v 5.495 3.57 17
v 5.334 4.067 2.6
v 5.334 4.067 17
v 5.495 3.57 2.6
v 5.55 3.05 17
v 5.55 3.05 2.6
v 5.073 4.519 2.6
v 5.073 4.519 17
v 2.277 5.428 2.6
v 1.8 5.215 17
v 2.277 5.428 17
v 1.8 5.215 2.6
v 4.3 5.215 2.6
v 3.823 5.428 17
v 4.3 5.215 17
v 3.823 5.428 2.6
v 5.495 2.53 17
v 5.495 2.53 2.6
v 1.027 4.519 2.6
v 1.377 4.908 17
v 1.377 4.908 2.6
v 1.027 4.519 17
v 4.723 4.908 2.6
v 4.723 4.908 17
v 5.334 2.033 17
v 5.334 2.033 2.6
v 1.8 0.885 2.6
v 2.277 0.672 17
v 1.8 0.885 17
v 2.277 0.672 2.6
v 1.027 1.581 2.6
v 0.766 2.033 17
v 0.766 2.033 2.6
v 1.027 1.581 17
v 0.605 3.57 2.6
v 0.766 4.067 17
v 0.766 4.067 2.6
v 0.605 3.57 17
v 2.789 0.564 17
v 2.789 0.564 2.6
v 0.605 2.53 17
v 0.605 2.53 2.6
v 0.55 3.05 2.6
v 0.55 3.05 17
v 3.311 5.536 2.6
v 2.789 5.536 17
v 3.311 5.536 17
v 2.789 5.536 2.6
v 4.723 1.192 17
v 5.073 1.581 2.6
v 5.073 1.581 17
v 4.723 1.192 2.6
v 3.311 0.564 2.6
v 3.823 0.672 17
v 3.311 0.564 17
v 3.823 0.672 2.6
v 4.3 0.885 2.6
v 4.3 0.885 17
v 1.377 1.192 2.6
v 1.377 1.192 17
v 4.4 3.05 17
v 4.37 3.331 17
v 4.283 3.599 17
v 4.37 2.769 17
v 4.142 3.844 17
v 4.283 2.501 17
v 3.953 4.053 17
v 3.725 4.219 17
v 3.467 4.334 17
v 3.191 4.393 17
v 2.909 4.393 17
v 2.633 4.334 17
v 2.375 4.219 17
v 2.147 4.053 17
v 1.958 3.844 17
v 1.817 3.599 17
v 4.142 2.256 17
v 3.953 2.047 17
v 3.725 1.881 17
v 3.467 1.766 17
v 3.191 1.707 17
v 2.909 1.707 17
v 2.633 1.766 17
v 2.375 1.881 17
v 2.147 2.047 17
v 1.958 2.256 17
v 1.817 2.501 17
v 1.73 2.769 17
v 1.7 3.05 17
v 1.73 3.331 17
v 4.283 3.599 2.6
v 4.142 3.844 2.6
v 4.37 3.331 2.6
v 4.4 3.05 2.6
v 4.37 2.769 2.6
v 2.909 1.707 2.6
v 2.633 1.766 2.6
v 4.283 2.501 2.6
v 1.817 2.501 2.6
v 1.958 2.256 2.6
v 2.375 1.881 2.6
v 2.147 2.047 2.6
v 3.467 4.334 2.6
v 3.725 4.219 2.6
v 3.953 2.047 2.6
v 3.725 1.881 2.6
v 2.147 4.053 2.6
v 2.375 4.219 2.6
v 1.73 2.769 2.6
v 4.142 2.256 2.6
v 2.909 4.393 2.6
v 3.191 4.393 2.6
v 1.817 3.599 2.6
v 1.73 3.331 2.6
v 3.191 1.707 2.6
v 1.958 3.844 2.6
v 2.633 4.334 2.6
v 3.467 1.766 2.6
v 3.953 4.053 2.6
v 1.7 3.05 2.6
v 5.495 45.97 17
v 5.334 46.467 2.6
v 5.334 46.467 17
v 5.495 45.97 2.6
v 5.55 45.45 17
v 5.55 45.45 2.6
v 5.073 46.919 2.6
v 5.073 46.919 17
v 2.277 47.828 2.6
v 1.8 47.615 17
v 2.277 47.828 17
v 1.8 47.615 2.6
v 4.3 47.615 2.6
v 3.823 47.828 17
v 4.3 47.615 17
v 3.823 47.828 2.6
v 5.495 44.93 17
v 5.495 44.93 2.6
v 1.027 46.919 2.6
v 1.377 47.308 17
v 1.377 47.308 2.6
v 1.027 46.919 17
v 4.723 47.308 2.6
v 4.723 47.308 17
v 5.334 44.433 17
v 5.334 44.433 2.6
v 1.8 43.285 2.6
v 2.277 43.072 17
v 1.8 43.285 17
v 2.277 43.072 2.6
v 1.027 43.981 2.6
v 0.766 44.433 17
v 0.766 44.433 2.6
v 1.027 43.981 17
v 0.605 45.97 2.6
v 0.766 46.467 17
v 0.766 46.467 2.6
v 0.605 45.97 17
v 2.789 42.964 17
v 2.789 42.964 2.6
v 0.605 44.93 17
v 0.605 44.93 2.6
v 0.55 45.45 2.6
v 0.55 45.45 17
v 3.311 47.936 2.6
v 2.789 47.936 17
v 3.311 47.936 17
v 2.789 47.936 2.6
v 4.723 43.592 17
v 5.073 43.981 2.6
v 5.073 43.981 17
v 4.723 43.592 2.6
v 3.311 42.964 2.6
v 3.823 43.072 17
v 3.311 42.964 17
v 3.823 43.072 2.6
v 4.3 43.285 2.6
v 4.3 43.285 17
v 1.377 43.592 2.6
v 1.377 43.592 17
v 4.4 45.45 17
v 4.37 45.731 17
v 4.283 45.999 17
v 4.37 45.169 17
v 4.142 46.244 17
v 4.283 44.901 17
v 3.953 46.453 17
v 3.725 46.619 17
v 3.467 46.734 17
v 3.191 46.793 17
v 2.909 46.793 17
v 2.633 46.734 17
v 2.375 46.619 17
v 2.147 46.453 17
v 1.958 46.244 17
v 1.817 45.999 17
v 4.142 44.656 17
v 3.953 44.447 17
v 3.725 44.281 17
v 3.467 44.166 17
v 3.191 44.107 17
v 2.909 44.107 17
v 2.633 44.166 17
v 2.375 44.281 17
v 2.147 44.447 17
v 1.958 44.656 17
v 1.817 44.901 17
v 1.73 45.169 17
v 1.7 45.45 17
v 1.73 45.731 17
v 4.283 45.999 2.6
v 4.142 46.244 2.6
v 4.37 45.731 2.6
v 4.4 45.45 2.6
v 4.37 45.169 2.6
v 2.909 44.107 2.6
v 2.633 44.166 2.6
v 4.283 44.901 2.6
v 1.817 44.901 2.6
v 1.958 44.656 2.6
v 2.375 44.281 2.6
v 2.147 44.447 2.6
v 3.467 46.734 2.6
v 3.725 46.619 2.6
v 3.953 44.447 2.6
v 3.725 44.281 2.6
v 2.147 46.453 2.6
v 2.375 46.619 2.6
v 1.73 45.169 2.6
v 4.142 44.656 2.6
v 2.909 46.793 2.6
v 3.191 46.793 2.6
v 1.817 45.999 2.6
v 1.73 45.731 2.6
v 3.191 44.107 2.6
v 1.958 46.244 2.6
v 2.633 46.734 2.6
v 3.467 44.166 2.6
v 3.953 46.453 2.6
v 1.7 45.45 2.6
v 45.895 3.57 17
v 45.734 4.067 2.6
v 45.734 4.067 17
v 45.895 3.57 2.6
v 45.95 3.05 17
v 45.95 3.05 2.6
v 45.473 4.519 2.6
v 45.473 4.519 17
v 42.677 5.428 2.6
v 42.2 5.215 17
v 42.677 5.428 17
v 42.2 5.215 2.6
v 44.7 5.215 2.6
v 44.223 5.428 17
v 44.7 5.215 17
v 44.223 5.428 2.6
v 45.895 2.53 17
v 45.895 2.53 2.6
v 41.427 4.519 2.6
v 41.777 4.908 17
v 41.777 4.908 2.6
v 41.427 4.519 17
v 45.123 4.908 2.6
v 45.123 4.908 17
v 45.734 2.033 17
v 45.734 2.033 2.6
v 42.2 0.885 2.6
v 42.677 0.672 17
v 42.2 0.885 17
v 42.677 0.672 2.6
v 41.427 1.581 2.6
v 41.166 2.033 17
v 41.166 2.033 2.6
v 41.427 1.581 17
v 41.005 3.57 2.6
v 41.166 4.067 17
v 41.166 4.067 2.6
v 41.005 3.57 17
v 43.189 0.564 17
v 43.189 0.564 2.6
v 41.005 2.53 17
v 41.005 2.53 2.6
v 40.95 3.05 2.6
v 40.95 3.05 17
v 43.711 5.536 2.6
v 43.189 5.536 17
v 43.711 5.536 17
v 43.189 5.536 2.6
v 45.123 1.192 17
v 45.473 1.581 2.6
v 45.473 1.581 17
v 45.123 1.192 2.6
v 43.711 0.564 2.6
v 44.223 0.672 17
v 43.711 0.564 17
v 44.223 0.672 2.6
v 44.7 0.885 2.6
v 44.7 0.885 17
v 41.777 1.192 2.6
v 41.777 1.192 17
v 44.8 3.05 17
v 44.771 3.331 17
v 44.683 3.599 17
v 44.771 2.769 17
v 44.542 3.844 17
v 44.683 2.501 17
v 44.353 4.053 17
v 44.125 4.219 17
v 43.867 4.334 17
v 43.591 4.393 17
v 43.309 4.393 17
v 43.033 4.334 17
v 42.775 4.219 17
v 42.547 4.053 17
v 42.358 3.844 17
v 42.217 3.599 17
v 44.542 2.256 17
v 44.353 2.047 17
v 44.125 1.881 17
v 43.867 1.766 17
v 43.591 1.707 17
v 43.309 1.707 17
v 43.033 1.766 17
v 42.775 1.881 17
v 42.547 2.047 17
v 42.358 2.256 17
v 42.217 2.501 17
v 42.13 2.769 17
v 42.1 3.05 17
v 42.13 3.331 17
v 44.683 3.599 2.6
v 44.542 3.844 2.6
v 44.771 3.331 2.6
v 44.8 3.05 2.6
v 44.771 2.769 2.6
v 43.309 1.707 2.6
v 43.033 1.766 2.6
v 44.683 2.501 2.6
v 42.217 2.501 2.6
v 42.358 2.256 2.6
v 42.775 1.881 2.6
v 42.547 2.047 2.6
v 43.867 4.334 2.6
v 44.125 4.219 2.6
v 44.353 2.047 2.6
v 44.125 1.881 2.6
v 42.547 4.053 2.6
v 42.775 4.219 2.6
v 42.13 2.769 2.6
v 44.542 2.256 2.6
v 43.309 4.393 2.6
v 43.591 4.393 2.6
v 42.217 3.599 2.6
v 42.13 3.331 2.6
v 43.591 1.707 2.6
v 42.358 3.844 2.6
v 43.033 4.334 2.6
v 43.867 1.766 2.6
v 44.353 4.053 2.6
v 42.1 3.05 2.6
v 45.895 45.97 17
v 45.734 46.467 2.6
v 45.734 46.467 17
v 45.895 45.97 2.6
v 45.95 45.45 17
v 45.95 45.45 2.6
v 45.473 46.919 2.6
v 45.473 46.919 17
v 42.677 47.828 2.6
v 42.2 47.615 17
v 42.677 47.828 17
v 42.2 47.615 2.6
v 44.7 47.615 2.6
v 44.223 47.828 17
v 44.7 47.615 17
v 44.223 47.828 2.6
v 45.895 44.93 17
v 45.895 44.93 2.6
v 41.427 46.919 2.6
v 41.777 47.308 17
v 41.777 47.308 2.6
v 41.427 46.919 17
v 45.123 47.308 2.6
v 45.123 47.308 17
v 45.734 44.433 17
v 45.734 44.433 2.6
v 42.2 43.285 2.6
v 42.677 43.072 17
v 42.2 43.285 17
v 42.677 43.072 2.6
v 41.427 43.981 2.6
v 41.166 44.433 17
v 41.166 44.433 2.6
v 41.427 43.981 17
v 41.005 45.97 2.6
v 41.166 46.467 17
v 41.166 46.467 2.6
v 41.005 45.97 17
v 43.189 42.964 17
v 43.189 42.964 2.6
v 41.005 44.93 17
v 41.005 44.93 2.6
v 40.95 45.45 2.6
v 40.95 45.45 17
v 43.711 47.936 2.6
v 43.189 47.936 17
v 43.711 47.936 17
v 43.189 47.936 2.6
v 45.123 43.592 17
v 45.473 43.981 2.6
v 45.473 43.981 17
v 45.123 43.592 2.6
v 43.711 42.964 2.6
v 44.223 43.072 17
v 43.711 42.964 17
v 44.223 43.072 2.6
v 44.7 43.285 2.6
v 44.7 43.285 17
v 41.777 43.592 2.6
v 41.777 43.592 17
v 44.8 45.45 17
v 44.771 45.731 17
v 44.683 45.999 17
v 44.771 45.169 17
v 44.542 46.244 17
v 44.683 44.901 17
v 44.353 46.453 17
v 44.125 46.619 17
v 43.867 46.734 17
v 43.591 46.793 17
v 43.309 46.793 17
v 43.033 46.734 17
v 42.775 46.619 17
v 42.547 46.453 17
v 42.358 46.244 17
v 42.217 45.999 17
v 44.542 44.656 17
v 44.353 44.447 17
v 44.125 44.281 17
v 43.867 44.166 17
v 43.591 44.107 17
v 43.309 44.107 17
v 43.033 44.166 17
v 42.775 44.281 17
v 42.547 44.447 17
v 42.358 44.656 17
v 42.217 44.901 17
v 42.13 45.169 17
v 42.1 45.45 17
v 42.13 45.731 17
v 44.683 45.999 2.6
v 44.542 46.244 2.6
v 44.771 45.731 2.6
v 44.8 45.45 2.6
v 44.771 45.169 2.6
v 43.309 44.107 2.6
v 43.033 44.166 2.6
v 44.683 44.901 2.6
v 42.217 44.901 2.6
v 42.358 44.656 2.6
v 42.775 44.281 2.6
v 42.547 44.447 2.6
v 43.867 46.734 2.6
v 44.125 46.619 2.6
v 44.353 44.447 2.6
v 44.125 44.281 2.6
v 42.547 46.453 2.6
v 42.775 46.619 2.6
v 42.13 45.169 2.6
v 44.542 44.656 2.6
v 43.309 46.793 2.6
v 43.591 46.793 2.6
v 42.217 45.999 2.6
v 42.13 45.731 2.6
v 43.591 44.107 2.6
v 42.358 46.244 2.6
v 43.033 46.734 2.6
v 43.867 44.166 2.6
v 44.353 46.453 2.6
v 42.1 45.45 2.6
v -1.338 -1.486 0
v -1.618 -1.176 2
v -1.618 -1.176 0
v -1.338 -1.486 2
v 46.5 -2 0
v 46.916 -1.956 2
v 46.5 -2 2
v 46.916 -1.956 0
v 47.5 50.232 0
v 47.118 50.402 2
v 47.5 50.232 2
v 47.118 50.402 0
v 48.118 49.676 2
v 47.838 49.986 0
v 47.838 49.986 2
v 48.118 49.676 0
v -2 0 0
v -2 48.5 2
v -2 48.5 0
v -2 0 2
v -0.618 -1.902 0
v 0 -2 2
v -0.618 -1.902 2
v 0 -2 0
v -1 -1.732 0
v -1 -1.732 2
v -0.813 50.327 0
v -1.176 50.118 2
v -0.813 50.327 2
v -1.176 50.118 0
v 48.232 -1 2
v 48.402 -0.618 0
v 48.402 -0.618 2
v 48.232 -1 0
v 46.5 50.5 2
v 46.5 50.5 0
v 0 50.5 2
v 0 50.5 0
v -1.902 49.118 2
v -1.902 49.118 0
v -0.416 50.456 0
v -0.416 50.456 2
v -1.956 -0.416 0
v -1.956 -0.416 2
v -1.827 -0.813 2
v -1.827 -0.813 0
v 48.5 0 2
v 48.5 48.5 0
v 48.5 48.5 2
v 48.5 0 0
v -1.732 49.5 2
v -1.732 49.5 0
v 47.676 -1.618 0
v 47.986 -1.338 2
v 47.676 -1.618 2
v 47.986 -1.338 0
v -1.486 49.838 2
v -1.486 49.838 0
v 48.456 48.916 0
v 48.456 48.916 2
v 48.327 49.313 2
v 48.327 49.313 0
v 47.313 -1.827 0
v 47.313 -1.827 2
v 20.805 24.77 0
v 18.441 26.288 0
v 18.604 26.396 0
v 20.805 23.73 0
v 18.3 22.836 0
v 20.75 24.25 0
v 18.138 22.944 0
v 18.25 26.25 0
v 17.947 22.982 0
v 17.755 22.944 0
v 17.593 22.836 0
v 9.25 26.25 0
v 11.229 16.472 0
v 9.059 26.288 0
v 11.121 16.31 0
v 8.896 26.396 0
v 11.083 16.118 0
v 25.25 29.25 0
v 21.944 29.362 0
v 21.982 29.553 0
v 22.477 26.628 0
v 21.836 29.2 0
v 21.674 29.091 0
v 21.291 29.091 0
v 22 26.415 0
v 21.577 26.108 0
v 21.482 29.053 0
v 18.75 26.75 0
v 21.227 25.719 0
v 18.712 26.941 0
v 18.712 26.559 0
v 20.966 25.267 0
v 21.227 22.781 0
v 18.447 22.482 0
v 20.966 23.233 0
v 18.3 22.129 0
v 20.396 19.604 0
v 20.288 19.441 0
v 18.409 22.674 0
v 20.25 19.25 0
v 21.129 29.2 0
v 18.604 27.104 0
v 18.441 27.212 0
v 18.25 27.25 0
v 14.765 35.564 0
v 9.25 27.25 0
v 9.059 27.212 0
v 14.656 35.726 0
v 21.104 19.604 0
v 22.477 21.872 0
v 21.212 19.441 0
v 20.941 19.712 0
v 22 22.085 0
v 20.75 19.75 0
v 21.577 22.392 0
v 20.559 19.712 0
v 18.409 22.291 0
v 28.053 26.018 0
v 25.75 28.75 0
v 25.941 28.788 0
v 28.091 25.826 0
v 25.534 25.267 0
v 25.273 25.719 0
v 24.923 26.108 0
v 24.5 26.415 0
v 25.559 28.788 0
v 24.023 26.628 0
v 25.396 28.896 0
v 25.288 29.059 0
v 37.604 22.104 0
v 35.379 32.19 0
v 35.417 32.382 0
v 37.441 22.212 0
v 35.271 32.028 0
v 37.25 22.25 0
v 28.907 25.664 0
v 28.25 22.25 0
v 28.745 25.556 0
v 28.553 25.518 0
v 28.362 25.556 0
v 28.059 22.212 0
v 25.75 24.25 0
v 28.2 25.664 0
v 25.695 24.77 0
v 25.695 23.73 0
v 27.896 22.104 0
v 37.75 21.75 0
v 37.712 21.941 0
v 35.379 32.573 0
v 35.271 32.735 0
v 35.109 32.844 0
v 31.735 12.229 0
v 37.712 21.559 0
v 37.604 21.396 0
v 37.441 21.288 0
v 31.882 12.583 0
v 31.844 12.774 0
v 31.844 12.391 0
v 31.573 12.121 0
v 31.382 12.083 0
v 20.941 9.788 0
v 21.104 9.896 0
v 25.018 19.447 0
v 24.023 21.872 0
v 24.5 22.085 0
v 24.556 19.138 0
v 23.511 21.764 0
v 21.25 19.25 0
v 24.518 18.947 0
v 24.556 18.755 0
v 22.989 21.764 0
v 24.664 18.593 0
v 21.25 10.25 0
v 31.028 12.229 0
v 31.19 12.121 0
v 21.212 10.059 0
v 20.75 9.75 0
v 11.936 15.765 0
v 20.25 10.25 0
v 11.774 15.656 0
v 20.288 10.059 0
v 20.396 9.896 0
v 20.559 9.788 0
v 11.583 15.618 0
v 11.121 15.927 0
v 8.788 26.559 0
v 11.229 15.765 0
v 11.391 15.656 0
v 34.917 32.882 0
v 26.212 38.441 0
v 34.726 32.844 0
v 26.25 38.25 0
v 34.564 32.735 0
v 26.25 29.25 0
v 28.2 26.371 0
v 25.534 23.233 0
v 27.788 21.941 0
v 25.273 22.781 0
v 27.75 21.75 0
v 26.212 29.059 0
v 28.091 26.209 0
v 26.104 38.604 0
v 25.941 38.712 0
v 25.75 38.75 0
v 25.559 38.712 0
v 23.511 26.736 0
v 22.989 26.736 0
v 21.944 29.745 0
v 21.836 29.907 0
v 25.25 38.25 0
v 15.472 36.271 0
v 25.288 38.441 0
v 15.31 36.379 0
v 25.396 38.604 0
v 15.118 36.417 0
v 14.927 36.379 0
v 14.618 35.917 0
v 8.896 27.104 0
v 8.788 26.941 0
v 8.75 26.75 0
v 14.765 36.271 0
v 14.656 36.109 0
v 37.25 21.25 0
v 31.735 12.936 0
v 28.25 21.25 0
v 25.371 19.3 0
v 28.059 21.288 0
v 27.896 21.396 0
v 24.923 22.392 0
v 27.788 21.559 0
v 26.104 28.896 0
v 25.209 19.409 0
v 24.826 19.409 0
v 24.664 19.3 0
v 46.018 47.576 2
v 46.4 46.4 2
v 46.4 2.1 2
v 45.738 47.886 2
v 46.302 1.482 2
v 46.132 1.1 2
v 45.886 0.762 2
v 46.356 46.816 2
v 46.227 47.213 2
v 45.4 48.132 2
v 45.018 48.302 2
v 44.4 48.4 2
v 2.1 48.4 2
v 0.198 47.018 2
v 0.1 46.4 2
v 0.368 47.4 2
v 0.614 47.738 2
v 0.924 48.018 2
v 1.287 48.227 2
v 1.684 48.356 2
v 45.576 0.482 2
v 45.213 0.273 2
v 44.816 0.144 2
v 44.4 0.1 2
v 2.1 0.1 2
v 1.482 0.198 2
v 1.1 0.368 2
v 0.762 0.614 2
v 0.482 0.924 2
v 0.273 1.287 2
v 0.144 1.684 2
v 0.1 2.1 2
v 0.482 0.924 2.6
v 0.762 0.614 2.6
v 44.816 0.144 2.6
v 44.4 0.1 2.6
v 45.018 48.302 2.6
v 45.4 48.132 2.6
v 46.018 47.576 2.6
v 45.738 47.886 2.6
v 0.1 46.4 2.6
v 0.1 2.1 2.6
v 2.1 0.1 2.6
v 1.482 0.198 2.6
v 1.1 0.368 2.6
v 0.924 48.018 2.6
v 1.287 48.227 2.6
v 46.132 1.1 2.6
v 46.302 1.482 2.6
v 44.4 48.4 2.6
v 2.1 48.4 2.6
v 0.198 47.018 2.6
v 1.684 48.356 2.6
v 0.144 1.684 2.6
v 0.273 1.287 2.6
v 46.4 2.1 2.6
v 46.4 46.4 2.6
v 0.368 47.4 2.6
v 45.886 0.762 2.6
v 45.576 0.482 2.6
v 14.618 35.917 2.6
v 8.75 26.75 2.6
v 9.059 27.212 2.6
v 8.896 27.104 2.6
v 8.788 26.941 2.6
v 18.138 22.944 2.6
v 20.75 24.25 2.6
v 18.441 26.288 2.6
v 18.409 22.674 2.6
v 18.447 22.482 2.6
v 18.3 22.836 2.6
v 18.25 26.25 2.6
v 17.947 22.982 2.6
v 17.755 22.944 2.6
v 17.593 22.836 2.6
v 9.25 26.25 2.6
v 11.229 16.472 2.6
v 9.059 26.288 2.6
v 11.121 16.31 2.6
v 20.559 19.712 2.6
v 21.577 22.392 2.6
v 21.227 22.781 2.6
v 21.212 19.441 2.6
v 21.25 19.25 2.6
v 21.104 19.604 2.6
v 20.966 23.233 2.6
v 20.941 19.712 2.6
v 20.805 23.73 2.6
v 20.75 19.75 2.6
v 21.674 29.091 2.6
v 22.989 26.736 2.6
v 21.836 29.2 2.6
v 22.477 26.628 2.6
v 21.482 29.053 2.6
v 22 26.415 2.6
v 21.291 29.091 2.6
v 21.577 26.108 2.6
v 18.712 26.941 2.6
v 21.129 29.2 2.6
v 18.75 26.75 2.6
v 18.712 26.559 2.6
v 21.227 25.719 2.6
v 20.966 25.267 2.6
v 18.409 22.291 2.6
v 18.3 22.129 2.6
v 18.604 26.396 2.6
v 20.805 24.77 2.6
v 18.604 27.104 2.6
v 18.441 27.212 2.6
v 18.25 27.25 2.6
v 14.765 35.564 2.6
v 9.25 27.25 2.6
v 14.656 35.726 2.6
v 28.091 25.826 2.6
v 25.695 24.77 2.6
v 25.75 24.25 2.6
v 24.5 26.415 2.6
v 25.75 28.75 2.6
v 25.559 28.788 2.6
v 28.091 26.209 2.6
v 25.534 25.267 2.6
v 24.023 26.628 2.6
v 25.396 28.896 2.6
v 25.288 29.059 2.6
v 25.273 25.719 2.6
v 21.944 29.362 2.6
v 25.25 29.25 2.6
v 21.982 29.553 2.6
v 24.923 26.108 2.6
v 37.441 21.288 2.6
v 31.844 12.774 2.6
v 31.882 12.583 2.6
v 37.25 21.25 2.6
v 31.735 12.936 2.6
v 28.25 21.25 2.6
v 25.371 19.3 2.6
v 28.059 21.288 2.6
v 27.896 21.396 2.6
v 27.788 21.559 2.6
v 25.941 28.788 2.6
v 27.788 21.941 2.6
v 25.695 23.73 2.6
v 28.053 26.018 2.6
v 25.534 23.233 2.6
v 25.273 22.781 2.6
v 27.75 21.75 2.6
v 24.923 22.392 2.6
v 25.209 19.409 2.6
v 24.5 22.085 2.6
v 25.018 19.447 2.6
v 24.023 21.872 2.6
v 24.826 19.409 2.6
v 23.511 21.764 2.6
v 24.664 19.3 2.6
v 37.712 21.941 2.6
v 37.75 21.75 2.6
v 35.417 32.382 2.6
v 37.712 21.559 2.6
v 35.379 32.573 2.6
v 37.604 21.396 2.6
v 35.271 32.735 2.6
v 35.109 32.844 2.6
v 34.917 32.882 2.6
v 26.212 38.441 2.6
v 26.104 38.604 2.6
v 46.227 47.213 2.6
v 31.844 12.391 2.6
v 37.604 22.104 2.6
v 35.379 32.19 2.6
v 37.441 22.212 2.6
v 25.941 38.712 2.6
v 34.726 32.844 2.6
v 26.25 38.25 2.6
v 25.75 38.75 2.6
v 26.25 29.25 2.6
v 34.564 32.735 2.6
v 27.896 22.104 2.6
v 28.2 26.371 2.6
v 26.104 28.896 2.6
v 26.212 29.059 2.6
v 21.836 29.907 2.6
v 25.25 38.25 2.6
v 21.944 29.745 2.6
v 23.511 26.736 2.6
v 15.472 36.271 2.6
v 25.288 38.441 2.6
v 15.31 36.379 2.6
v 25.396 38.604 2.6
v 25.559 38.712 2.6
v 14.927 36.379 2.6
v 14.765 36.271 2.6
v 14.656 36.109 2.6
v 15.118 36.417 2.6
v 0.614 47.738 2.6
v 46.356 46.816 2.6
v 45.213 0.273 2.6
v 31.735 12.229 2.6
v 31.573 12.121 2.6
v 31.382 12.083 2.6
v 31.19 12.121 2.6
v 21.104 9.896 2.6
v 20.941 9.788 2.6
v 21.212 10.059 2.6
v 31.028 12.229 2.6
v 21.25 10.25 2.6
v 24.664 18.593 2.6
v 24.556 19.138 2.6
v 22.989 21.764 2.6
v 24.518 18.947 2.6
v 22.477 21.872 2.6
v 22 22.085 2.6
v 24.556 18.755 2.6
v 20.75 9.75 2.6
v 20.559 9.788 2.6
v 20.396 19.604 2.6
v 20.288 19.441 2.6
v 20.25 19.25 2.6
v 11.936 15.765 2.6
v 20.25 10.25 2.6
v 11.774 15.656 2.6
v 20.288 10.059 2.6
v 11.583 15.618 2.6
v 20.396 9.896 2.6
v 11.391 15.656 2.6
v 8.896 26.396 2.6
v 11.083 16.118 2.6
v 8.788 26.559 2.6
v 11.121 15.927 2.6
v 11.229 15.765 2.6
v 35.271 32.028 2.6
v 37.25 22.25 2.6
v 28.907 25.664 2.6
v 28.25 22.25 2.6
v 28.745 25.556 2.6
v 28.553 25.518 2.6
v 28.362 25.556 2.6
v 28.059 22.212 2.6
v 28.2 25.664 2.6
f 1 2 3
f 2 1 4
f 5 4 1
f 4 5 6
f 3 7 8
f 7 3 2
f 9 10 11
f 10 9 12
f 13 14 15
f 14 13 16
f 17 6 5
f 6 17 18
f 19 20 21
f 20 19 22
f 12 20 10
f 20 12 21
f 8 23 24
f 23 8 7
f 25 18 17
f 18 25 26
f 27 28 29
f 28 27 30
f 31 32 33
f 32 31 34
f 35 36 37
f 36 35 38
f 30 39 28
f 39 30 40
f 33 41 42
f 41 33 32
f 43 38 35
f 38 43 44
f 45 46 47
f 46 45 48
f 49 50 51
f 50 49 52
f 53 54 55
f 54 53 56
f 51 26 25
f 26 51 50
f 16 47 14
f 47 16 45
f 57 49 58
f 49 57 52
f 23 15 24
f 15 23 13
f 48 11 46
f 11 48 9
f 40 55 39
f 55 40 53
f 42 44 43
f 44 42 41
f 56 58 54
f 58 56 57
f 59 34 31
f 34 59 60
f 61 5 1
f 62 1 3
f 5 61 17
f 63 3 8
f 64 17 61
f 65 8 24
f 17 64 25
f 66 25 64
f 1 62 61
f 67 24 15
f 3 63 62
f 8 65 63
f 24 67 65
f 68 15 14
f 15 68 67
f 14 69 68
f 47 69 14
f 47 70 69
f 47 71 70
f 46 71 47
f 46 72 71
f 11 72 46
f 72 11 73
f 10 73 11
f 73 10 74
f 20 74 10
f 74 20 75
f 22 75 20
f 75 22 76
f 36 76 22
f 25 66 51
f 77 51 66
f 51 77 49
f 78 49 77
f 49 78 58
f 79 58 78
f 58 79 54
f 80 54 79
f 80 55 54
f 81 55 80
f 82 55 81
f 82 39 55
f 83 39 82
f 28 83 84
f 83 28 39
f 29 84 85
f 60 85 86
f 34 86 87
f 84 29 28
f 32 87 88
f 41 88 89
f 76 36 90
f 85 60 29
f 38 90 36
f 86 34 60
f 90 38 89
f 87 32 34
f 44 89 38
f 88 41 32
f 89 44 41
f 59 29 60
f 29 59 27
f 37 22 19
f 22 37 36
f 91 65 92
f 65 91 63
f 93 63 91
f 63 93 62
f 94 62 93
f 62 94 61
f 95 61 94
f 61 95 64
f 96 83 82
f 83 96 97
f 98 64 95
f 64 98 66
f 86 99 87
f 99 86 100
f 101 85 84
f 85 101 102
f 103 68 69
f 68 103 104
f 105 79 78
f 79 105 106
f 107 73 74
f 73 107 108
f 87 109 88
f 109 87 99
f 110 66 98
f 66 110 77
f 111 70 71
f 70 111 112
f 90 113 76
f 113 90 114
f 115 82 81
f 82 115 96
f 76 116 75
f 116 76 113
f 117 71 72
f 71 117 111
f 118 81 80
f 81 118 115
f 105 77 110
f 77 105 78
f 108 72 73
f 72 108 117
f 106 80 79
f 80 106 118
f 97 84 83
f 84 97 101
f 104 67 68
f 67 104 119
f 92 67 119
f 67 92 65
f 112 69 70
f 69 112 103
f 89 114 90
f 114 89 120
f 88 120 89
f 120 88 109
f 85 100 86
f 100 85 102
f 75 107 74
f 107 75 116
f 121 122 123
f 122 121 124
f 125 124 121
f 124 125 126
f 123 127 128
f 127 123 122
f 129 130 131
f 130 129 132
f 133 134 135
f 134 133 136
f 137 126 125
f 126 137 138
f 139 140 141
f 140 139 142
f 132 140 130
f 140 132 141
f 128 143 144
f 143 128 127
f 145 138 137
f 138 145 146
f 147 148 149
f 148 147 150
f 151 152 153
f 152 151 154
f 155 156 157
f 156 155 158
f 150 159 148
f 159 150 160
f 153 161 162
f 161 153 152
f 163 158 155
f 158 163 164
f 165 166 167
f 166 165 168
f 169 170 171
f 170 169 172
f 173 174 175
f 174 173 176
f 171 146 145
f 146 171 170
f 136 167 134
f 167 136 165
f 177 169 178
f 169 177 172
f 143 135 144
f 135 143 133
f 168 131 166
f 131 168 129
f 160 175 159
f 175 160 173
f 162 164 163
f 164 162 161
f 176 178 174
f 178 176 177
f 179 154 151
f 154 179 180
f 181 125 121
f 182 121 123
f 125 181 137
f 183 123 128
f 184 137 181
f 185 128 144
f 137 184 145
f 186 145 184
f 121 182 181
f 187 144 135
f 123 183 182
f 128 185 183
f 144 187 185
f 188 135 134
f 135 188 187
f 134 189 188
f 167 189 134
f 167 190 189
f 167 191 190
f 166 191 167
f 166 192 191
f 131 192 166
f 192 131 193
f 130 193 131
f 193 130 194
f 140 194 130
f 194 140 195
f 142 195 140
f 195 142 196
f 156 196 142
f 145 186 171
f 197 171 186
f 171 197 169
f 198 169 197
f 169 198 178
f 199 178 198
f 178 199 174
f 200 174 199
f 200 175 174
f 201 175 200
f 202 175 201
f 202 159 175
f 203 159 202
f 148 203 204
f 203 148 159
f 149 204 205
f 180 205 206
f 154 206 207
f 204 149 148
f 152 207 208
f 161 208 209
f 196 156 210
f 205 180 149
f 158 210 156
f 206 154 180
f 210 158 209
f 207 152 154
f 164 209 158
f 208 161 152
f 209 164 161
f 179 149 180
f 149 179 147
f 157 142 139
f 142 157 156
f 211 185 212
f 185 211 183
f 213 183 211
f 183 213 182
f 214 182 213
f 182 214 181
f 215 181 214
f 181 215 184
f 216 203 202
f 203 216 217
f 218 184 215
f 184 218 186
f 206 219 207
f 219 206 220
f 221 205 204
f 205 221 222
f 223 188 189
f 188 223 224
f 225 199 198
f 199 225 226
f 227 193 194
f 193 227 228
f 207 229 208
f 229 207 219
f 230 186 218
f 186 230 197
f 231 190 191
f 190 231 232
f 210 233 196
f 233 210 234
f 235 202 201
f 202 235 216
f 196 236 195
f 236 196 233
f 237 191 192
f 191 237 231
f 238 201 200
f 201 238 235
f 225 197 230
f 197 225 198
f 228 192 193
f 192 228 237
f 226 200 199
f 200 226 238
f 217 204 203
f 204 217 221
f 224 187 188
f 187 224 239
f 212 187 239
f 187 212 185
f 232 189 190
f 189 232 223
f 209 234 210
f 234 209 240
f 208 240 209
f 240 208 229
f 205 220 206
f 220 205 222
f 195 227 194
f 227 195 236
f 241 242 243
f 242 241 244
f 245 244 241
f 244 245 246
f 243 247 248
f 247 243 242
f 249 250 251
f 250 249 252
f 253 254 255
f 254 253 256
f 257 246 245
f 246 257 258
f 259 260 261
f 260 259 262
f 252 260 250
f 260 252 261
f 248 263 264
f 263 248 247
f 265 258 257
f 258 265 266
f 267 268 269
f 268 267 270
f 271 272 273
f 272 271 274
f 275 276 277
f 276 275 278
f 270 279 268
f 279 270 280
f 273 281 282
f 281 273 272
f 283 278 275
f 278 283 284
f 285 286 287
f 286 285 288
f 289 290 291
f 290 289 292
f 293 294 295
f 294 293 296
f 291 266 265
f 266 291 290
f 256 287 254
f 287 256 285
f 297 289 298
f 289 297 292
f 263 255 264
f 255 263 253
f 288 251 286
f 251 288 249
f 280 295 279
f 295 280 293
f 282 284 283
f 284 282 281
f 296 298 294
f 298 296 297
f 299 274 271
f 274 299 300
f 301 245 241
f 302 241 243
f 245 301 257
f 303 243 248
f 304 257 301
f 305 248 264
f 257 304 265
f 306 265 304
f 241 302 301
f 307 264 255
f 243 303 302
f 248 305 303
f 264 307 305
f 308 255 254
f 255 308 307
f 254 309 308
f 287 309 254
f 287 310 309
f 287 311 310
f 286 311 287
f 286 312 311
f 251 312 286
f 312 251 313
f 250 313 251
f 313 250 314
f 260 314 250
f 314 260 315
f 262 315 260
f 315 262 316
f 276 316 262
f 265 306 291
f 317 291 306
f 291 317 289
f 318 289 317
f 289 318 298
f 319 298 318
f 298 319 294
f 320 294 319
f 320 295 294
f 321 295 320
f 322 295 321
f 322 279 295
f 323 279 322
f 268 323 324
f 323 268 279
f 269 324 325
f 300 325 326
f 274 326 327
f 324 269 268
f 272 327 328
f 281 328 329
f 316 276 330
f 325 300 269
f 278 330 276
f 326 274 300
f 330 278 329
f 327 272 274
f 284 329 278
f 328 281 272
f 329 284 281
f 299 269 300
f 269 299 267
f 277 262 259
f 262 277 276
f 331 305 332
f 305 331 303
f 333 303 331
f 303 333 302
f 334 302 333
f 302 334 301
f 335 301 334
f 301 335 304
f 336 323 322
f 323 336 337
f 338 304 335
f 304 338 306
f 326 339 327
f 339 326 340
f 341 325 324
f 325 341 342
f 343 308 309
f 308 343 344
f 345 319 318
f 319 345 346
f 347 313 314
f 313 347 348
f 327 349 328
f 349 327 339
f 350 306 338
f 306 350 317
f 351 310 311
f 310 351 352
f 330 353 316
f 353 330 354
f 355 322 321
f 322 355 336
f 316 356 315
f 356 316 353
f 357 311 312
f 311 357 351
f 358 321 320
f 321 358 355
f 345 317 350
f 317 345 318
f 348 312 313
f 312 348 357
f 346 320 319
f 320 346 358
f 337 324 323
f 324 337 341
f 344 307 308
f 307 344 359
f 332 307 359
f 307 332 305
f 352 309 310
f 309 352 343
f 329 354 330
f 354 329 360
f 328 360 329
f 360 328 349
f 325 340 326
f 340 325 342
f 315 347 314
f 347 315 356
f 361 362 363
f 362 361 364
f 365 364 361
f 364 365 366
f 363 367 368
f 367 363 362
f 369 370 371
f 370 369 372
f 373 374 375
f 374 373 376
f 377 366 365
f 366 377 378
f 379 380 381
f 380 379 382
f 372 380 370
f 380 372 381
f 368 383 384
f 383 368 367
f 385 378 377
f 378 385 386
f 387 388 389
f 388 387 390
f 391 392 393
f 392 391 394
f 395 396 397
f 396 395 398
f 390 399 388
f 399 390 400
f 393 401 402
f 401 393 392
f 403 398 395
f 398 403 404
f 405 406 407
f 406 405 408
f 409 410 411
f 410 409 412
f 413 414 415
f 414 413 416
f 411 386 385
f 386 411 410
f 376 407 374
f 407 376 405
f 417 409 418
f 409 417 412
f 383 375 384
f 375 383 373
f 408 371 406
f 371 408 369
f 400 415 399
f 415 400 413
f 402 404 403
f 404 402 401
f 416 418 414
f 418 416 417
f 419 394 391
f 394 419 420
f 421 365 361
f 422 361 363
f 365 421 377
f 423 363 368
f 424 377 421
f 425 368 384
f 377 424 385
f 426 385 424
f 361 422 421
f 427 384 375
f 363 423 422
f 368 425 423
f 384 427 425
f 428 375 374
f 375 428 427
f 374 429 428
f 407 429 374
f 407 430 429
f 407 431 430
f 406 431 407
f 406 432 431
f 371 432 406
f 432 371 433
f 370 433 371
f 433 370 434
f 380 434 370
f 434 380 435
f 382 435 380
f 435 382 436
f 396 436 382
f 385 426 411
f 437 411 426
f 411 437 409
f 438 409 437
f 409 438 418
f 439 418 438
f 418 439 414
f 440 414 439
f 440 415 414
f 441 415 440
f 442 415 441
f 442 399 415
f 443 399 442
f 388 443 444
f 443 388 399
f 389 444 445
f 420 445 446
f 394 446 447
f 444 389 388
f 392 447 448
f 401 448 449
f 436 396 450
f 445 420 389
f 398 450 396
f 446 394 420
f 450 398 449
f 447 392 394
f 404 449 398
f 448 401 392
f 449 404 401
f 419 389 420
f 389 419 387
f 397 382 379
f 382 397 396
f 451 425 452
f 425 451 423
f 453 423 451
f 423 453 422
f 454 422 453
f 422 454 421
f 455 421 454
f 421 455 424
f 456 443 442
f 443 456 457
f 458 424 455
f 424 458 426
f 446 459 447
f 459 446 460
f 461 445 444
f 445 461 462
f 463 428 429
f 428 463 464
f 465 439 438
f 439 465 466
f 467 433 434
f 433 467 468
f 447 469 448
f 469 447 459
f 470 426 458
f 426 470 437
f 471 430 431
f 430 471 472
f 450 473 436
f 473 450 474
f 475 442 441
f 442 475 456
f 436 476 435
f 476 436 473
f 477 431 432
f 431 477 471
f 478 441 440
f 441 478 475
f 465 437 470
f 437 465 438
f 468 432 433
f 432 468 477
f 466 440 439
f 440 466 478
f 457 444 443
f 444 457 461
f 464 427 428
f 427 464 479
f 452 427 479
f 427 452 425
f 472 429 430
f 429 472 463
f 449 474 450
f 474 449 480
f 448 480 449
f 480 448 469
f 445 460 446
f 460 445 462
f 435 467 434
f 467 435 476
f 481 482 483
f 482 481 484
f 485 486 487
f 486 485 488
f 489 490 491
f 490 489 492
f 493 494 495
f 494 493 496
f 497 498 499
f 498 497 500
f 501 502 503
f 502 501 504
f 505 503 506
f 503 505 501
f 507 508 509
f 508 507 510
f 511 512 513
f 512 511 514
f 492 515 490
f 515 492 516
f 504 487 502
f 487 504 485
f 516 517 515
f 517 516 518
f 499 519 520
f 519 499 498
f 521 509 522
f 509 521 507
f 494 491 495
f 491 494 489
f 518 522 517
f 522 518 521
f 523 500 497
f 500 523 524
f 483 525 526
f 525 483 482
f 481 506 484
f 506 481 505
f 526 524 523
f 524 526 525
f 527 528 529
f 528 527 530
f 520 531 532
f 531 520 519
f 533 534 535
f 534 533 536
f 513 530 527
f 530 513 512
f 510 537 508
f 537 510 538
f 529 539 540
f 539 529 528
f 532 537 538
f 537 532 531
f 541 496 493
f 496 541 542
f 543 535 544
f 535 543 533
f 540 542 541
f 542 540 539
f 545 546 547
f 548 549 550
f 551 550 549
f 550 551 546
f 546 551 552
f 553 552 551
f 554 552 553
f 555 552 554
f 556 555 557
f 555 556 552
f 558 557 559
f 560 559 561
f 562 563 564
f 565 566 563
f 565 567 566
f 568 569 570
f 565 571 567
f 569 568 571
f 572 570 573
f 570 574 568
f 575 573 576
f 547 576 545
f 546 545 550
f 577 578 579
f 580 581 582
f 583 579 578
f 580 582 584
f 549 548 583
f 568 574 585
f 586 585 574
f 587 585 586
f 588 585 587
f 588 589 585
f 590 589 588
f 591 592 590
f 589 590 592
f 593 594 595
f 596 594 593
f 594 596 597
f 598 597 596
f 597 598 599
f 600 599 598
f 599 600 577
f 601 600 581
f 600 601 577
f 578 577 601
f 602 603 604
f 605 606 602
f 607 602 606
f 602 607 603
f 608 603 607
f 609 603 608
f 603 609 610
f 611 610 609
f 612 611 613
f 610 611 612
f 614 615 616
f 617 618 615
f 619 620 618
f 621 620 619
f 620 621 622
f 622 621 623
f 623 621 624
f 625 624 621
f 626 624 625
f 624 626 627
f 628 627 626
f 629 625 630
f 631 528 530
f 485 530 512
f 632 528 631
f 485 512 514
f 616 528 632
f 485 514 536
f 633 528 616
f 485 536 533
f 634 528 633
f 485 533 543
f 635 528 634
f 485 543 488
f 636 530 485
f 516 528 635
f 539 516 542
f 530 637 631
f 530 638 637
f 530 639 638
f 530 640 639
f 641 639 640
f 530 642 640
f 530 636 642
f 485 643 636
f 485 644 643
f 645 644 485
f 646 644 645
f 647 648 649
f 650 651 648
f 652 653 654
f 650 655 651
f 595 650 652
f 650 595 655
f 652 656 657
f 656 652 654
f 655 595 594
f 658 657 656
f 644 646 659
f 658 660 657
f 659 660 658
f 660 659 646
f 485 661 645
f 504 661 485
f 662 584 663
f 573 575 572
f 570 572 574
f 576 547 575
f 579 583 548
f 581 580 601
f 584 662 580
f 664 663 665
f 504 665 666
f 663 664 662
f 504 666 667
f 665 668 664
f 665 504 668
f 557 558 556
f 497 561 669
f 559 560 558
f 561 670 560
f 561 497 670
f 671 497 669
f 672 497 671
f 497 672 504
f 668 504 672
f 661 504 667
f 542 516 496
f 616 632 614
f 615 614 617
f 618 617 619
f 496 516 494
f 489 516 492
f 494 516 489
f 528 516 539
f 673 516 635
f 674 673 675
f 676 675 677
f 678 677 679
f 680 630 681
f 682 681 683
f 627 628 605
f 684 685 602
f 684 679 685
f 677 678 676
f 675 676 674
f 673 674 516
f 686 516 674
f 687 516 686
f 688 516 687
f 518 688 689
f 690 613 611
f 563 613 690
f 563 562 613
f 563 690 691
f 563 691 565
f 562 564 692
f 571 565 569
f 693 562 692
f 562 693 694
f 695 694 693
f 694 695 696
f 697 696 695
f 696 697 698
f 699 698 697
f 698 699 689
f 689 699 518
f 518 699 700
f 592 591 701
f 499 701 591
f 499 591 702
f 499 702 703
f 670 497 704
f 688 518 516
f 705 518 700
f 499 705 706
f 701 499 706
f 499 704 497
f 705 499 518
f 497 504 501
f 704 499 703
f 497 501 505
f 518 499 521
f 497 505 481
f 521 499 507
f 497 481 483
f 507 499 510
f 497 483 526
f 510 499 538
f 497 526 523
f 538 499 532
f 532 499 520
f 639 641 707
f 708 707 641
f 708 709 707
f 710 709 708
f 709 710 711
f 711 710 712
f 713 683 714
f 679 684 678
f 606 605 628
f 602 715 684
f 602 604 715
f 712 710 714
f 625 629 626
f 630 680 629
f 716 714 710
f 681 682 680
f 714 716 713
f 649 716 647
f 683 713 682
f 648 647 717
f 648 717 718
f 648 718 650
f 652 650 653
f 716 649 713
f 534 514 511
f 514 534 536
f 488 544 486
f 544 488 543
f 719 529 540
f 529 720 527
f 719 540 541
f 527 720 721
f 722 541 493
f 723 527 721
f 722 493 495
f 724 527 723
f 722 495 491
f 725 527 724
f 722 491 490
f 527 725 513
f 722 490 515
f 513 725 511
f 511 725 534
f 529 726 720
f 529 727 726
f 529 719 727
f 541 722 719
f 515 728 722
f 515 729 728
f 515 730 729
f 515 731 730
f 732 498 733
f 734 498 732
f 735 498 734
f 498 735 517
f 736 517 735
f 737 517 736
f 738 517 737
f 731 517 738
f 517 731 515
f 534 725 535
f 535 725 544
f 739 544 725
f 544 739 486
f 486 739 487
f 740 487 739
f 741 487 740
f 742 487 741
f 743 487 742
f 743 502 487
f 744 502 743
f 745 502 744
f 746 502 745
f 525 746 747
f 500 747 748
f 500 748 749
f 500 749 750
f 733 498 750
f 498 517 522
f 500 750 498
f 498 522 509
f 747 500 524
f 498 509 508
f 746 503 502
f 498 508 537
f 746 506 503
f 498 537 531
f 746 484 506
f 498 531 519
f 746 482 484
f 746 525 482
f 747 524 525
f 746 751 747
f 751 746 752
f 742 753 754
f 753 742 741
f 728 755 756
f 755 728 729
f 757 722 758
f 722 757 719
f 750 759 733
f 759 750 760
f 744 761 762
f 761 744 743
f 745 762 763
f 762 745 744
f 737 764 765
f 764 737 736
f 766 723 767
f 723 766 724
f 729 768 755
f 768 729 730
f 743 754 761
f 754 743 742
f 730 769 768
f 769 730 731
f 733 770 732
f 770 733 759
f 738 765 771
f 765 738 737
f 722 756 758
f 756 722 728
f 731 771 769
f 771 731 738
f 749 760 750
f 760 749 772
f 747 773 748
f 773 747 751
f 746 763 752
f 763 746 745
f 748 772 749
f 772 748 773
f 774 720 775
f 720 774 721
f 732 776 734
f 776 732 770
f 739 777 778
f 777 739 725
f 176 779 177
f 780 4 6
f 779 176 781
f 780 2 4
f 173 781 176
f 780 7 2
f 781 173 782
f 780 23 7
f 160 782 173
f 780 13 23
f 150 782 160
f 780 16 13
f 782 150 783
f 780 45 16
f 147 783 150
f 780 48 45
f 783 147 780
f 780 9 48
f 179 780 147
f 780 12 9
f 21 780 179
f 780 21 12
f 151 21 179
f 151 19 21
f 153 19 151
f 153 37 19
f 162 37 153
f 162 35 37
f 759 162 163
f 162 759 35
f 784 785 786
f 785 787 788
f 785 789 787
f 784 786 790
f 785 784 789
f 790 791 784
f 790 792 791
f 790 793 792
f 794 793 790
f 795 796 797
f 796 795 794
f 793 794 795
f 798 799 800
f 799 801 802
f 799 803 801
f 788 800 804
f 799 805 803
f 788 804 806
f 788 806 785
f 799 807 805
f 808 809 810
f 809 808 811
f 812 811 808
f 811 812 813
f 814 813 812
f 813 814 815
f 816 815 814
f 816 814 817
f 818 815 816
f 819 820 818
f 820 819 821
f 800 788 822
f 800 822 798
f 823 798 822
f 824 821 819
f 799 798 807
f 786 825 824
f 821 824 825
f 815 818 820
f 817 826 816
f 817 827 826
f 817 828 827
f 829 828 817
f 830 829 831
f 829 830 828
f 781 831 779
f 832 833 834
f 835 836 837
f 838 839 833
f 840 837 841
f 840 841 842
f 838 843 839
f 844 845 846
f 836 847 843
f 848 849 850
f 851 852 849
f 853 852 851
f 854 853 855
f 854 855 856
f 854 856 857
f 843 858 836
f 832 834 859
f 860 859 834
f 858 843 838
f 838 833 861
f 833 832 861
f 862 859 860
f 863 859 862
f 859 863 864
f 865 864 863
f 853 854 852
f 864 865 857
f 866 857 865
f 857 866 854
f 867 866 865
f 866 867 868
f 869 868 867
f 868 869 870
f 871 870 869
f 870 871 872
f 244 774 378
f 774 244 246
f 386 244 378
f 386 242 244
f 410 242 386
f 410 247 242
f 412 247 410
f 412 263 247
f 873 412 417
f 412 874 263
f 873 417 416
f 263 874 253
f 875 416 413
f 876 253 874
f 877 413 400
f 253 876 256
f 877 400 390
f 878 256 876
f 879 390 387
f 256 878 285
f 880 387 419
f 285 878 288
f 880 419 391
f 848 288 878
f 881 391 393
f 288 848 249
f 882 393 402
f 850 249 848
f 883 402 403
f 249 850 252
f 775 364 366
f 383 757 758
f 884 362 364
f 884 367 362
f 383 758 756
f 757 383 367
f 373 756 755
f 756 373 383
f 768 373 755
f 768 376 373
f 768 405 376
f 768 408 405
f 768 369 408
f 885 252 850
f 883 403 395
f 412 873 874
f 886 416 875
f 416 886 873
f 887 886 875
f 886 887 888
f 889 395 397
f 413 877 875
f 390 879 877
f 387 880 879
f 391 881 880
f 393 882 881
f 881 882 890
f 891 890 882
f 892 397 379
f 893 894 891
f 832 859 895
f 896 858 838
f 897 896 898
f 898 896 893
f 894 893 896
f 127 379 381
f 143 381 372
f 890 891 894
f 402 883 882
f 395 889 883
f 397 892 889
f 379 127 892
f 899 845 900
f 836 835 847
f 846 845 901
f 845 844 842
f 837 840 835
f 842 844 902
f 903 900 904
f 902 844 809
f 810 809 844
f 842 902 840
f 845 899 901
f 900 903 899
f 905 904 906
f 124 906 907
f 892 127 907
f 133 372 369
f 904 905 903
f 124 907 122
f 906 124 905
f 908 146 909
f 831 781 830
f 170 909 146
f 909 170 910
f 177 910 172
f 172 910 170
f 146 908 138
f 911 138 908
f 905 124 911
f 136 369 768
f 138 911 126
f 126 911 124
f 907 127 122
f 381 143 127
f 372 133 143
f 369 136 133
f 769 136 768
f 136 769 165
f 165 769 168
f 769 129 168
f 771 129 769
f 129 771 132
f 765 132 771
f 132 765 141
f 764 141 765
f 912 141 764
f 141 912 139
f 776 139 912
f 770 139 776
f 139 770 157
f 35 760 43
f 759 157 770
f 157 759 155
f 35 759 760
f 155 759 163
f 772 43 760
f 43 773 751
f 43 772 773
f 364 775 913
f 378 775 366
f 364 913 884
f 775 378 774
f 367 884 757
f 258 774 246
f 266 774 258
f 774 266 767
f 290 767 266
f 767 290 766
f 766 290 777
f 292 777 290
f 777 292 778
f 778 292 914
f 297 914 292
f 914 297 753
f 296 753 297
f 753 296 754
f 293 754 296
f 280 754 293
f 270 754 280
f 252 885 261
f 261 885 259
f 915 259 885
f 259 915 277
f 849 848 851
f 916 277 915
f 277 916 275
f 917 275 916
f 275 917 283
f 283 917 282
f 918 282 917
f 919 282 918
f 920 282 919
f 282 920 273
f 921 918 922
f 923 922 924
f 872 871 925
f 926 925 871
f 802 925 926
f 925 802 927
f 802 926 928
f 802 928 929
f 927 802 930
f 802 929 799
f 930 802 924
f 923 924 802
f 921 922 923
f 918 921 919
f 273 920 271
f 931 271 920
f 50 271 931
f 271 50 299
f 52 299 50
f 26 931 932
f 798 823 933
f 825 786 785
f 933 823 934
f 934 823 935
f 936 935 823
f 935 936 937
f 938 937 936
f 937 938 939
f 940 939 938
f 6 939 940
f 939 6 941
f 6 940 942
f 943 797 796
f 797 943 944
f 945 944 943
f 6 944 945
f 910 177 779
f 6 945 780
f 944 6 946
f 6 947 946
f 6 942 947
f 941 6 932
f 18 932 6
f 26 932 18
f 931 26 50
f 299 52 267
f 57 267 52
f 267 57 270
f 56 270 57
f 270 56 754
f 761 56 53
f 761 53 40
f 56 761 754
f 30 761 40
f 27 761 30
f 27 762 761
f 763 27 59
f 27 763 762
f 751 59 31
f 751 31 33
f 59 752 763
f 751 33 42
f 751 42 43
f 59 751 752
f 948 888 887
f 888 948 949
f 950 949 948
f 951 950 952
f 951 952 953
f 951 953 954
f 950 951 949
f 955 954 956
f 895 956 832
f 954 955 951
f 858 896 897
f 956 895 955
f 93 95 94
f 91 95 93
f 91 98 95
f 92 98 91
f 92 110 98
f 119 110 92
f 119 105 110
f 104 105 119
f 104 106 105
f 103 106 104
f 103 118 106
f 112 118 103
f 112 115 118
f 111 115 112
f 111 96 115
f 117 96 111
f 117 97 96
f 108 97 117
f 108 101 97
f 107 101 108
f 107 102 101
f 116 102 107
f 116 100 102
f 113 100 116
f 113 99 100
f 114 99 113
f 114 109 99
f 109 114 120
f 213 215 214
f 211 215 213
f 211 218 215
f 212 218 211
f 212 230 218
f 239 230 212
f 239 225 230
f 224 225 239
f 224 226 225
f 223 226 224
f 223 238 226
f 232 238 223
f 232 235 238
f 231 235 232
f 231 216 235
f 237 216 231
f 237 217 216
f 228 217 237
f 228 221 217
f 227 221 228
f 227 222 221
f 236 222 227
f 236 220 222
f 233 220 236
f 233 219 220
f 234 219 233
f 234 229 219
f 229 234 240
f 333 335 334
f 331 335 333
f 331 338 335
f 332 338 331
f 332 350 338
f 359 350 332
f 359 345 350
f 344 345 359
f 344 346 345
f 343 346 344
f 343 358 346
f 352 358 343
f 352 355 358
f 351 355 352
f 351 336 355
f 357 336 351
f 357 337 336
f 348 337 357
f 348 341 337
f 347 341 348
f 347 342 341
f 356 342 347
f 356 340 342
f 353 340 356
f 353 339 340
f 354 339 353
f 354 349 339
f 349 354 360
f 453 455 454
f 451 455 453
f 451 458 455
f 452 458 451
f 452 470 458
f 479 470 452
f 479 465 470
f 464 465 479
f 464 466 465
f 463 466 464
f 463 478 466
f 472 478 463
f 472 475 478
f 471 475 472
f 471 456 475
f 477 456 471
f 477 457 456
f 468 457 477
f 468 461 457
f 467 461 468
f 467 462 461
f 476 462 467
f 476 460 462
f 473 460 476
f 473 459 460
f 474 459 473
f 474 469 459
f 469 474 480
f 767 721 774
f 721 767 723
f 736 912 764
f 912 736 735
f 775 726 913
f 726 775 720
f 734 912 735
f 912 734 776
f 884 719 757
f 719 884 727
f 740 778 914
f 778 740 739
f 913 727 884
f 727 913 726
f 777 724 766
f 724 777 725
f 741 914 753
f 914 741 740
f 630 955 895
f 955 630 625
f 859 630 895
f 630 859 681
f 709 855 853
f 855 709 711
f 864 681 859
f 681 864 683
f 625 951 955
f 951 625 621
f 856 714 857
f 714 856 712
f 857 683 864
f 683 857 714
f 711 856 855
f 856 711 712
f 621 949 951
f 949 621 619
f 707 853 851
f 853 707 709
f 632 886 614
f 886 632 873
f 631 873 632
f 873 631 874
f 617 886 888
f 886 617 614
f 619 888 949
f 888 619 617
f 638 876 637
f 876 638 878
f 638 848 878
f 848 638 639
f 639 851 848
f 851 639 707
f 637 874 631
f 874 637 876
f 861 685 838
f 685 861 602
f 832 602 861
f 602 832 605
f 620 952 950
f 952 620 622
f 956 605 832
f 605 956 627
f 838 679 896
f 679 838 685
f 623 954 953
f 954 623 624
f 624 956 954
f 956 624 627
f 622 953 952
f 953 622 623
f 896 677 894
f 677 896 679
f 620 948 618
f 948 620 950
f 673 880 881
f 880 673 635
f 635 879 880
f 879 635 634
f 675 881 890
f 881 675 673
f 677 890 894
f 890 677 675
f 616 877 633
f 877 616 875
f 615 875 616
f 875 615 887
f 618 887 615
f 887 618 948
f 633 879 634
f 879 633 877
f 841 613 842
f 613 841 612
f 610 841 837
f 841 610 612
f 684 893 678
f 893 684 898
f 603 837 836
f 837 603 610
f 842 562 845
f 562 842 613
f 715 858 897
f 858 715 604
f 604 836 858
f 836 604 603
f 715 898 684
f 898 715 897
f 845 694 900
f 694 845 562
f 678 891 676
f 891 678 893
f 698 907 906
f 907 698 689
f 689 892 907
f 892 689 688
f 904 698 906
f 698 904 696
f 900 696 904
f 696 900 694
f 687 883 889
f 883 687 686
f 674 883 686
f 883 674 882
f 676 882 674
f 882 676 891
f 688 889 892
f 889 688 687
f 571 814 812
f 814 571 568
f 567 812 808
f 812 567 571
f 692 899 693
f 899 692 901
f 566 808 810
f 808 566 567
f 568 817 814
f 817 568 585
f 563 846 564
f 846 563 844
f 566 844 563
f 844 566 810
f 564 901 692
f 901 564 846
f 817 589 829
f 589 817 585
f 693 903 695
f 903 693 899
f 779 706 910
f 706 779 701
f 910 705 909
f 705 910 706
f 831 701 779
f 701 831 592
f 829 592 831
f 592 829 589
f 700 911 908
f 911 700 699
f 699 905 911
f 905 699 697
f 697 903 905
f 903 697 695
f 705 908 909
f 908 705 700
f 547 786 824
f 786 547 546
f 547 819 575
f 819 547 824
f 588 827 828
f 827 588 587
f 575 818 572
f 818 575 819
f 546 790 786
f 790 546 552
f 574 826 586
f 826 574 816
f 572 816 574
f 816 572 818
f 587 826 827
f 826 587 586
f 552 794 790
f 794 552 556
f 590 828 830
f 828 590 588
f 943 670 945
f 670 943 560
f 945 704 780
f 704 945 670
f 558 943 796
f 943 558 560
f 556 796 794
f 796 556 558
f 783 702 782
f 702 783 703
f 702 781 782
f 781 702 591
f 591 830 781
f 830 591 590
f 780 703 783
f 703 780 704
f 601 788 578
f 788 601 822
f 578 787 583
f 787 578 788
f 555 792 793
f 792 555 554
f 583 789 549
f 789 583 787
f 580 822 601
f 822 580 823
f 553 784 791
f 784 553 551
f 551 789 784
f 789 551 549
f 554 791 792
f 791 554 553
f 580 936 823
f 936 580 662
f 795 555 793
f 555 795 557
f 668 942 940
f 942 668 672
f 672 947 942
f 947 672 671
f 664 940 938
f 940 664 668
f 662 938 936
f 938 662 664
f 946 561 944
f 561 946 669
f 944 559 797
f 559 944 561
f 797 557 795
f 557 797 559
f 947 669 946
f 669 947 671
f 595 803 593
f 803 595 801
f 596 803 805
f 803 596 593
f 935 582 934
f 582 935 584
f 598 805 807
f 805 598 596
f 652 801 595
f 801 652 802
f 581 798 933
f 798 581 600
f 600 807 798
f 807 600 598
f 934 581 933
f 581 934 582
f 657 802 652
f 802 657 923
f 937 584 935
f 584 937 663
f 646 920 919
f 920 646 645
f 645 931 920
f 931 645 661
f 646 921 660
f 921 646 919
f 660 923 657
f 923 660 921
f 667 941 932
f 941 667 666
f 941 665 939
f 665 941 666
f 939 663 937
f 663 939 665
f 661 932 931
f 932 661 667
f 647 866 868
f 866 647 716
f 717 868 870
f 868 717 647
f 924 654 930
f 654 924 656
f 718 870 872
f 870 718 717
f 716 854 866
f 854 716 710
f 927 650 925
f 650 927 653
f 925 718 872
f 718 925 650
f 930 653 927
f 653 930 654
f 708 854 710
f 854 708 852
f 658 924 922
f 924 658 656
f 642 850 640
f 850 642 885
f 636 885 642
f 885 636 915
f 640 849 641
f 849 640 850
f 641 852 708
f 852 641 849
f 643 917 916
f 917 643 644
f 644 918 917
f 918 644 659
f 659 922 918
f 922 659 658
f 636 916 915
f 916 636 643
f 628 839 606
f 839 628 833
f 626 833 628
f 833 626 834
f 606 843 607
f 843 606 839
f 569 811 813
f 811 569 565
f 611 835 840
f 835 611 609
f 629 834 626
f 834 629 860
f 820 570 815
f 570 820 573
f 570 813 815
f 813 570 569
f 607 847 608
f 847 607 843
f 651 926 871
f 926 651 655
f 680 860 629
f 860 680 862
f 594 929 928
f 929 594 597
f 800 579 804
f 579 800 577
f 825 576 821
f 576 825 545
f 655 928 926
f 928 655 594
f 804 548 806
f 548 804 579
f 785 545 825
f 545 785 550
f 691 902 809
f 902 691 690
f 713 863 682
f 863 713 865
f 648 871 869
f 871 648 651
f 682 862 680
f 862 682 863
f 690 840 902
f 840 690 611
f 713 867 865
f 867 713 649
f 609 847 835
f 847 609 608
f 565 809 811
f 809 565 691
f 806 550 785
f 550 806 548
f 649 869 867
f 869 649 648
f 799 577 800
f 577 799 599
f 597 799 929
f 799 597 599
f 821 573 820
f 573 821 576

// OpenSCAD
// Orange Pi Zero enclosure: lid
// (c) 2018, Phil Dubach
//
// Creative Commons License
// Orange Pi Zero Case by Phil Dubach is licensed under a Creative Commons Attribution-NonCommercial-ShareAlike 4.0 International License.
// Based on a work at https://github.com/phildubach/OrangePiZeroCase.

pcb_w = 46.1;
pcb_l = 48.1;
pcb_h = 1.6;

pcb_below = 3;
pcb_above = 15;

wall = 2;
gap = 0.2;

$fs = 0.2;
eps = 0.001;

inner_w = pcb_w + 2*gap;
inner_l = pcb_l + 2*gap;

outer_w = inner_w + 2*wall;
outer_l = inner_l + 2*wall;

inner_h = pcb_below + pcb_h + pcb_above;

raised_gap = 0.1;
raised_w = inner_w - 2*raised_gap;
raised_l = inner_l - 2*raised_gap;
raised_r = 2;
raised_h = 0.6;

hole_d = 2.7;
hole_inset = 1.5 + hole_d/2; // actually 1.4 to 1.6

post_d = 5;

antenna_d = 5;

slit_w = 1;
slit_l = 10;

corners=[
    [gap+hole_inset, gap+hole_inset],
    [gap+hole_inset, inner_l-gap-hole_inset],
    [inner_w-gap-hole_inset, gap+hole_inset],
    [inner_w-gap-hole_inset, inner_l-gap-hole_inset]
];

module standoff(di, do, h) {
    difference() {
        cylinder(h=h, d=do);
        translate([0,0,-eps]) cylinder(h=h+2*eps, d=di);
    }
}

difference() {
    union() {
        // rounded top lid
        linear_extrude(height=wall) offset(r=wall) square([inner_w, inner_l]);
        // raised area to center lid on bottom shell
        translate([raised_r+raised_gap, raised_r+raised_gap, wall-eps]) linear_extrude(height=raised_h+eps) offset(r=raised_r) square([raised_w-2*raised_r, raised_l-2*raised_r]);
        // hollow posts for M3 machine screws
        for (pos = corners) {
            translate([pos[0], pos[1], wall]) standoff(di=hole_d, do=post_d, h=pcb_above);
        }
    }
    
    translate([inner_w/2, inner_l/2, -eps]) {
        through_h = wall + raised_h + 2*eps;
        // antenna hole
        cylinder(h=through_h, d=antenna_d);
        // ventilation slits
        for (angle=[0:45:360]) rotate([0,0,angle]) {
            translate([antenna_d/2+slit_w/2+wall,-antenna_d/2,0]) {
                cylinder(d=slit_w, h=through_h);
                translate([0, -slit_w/2, 0]) cube([slit_l-slit_w, slit_w, through_h]);
                translate([slit_l-slit_w,0,0]) cylinder(d=slit_w, h=through_h);
            }
        }
    }
}
